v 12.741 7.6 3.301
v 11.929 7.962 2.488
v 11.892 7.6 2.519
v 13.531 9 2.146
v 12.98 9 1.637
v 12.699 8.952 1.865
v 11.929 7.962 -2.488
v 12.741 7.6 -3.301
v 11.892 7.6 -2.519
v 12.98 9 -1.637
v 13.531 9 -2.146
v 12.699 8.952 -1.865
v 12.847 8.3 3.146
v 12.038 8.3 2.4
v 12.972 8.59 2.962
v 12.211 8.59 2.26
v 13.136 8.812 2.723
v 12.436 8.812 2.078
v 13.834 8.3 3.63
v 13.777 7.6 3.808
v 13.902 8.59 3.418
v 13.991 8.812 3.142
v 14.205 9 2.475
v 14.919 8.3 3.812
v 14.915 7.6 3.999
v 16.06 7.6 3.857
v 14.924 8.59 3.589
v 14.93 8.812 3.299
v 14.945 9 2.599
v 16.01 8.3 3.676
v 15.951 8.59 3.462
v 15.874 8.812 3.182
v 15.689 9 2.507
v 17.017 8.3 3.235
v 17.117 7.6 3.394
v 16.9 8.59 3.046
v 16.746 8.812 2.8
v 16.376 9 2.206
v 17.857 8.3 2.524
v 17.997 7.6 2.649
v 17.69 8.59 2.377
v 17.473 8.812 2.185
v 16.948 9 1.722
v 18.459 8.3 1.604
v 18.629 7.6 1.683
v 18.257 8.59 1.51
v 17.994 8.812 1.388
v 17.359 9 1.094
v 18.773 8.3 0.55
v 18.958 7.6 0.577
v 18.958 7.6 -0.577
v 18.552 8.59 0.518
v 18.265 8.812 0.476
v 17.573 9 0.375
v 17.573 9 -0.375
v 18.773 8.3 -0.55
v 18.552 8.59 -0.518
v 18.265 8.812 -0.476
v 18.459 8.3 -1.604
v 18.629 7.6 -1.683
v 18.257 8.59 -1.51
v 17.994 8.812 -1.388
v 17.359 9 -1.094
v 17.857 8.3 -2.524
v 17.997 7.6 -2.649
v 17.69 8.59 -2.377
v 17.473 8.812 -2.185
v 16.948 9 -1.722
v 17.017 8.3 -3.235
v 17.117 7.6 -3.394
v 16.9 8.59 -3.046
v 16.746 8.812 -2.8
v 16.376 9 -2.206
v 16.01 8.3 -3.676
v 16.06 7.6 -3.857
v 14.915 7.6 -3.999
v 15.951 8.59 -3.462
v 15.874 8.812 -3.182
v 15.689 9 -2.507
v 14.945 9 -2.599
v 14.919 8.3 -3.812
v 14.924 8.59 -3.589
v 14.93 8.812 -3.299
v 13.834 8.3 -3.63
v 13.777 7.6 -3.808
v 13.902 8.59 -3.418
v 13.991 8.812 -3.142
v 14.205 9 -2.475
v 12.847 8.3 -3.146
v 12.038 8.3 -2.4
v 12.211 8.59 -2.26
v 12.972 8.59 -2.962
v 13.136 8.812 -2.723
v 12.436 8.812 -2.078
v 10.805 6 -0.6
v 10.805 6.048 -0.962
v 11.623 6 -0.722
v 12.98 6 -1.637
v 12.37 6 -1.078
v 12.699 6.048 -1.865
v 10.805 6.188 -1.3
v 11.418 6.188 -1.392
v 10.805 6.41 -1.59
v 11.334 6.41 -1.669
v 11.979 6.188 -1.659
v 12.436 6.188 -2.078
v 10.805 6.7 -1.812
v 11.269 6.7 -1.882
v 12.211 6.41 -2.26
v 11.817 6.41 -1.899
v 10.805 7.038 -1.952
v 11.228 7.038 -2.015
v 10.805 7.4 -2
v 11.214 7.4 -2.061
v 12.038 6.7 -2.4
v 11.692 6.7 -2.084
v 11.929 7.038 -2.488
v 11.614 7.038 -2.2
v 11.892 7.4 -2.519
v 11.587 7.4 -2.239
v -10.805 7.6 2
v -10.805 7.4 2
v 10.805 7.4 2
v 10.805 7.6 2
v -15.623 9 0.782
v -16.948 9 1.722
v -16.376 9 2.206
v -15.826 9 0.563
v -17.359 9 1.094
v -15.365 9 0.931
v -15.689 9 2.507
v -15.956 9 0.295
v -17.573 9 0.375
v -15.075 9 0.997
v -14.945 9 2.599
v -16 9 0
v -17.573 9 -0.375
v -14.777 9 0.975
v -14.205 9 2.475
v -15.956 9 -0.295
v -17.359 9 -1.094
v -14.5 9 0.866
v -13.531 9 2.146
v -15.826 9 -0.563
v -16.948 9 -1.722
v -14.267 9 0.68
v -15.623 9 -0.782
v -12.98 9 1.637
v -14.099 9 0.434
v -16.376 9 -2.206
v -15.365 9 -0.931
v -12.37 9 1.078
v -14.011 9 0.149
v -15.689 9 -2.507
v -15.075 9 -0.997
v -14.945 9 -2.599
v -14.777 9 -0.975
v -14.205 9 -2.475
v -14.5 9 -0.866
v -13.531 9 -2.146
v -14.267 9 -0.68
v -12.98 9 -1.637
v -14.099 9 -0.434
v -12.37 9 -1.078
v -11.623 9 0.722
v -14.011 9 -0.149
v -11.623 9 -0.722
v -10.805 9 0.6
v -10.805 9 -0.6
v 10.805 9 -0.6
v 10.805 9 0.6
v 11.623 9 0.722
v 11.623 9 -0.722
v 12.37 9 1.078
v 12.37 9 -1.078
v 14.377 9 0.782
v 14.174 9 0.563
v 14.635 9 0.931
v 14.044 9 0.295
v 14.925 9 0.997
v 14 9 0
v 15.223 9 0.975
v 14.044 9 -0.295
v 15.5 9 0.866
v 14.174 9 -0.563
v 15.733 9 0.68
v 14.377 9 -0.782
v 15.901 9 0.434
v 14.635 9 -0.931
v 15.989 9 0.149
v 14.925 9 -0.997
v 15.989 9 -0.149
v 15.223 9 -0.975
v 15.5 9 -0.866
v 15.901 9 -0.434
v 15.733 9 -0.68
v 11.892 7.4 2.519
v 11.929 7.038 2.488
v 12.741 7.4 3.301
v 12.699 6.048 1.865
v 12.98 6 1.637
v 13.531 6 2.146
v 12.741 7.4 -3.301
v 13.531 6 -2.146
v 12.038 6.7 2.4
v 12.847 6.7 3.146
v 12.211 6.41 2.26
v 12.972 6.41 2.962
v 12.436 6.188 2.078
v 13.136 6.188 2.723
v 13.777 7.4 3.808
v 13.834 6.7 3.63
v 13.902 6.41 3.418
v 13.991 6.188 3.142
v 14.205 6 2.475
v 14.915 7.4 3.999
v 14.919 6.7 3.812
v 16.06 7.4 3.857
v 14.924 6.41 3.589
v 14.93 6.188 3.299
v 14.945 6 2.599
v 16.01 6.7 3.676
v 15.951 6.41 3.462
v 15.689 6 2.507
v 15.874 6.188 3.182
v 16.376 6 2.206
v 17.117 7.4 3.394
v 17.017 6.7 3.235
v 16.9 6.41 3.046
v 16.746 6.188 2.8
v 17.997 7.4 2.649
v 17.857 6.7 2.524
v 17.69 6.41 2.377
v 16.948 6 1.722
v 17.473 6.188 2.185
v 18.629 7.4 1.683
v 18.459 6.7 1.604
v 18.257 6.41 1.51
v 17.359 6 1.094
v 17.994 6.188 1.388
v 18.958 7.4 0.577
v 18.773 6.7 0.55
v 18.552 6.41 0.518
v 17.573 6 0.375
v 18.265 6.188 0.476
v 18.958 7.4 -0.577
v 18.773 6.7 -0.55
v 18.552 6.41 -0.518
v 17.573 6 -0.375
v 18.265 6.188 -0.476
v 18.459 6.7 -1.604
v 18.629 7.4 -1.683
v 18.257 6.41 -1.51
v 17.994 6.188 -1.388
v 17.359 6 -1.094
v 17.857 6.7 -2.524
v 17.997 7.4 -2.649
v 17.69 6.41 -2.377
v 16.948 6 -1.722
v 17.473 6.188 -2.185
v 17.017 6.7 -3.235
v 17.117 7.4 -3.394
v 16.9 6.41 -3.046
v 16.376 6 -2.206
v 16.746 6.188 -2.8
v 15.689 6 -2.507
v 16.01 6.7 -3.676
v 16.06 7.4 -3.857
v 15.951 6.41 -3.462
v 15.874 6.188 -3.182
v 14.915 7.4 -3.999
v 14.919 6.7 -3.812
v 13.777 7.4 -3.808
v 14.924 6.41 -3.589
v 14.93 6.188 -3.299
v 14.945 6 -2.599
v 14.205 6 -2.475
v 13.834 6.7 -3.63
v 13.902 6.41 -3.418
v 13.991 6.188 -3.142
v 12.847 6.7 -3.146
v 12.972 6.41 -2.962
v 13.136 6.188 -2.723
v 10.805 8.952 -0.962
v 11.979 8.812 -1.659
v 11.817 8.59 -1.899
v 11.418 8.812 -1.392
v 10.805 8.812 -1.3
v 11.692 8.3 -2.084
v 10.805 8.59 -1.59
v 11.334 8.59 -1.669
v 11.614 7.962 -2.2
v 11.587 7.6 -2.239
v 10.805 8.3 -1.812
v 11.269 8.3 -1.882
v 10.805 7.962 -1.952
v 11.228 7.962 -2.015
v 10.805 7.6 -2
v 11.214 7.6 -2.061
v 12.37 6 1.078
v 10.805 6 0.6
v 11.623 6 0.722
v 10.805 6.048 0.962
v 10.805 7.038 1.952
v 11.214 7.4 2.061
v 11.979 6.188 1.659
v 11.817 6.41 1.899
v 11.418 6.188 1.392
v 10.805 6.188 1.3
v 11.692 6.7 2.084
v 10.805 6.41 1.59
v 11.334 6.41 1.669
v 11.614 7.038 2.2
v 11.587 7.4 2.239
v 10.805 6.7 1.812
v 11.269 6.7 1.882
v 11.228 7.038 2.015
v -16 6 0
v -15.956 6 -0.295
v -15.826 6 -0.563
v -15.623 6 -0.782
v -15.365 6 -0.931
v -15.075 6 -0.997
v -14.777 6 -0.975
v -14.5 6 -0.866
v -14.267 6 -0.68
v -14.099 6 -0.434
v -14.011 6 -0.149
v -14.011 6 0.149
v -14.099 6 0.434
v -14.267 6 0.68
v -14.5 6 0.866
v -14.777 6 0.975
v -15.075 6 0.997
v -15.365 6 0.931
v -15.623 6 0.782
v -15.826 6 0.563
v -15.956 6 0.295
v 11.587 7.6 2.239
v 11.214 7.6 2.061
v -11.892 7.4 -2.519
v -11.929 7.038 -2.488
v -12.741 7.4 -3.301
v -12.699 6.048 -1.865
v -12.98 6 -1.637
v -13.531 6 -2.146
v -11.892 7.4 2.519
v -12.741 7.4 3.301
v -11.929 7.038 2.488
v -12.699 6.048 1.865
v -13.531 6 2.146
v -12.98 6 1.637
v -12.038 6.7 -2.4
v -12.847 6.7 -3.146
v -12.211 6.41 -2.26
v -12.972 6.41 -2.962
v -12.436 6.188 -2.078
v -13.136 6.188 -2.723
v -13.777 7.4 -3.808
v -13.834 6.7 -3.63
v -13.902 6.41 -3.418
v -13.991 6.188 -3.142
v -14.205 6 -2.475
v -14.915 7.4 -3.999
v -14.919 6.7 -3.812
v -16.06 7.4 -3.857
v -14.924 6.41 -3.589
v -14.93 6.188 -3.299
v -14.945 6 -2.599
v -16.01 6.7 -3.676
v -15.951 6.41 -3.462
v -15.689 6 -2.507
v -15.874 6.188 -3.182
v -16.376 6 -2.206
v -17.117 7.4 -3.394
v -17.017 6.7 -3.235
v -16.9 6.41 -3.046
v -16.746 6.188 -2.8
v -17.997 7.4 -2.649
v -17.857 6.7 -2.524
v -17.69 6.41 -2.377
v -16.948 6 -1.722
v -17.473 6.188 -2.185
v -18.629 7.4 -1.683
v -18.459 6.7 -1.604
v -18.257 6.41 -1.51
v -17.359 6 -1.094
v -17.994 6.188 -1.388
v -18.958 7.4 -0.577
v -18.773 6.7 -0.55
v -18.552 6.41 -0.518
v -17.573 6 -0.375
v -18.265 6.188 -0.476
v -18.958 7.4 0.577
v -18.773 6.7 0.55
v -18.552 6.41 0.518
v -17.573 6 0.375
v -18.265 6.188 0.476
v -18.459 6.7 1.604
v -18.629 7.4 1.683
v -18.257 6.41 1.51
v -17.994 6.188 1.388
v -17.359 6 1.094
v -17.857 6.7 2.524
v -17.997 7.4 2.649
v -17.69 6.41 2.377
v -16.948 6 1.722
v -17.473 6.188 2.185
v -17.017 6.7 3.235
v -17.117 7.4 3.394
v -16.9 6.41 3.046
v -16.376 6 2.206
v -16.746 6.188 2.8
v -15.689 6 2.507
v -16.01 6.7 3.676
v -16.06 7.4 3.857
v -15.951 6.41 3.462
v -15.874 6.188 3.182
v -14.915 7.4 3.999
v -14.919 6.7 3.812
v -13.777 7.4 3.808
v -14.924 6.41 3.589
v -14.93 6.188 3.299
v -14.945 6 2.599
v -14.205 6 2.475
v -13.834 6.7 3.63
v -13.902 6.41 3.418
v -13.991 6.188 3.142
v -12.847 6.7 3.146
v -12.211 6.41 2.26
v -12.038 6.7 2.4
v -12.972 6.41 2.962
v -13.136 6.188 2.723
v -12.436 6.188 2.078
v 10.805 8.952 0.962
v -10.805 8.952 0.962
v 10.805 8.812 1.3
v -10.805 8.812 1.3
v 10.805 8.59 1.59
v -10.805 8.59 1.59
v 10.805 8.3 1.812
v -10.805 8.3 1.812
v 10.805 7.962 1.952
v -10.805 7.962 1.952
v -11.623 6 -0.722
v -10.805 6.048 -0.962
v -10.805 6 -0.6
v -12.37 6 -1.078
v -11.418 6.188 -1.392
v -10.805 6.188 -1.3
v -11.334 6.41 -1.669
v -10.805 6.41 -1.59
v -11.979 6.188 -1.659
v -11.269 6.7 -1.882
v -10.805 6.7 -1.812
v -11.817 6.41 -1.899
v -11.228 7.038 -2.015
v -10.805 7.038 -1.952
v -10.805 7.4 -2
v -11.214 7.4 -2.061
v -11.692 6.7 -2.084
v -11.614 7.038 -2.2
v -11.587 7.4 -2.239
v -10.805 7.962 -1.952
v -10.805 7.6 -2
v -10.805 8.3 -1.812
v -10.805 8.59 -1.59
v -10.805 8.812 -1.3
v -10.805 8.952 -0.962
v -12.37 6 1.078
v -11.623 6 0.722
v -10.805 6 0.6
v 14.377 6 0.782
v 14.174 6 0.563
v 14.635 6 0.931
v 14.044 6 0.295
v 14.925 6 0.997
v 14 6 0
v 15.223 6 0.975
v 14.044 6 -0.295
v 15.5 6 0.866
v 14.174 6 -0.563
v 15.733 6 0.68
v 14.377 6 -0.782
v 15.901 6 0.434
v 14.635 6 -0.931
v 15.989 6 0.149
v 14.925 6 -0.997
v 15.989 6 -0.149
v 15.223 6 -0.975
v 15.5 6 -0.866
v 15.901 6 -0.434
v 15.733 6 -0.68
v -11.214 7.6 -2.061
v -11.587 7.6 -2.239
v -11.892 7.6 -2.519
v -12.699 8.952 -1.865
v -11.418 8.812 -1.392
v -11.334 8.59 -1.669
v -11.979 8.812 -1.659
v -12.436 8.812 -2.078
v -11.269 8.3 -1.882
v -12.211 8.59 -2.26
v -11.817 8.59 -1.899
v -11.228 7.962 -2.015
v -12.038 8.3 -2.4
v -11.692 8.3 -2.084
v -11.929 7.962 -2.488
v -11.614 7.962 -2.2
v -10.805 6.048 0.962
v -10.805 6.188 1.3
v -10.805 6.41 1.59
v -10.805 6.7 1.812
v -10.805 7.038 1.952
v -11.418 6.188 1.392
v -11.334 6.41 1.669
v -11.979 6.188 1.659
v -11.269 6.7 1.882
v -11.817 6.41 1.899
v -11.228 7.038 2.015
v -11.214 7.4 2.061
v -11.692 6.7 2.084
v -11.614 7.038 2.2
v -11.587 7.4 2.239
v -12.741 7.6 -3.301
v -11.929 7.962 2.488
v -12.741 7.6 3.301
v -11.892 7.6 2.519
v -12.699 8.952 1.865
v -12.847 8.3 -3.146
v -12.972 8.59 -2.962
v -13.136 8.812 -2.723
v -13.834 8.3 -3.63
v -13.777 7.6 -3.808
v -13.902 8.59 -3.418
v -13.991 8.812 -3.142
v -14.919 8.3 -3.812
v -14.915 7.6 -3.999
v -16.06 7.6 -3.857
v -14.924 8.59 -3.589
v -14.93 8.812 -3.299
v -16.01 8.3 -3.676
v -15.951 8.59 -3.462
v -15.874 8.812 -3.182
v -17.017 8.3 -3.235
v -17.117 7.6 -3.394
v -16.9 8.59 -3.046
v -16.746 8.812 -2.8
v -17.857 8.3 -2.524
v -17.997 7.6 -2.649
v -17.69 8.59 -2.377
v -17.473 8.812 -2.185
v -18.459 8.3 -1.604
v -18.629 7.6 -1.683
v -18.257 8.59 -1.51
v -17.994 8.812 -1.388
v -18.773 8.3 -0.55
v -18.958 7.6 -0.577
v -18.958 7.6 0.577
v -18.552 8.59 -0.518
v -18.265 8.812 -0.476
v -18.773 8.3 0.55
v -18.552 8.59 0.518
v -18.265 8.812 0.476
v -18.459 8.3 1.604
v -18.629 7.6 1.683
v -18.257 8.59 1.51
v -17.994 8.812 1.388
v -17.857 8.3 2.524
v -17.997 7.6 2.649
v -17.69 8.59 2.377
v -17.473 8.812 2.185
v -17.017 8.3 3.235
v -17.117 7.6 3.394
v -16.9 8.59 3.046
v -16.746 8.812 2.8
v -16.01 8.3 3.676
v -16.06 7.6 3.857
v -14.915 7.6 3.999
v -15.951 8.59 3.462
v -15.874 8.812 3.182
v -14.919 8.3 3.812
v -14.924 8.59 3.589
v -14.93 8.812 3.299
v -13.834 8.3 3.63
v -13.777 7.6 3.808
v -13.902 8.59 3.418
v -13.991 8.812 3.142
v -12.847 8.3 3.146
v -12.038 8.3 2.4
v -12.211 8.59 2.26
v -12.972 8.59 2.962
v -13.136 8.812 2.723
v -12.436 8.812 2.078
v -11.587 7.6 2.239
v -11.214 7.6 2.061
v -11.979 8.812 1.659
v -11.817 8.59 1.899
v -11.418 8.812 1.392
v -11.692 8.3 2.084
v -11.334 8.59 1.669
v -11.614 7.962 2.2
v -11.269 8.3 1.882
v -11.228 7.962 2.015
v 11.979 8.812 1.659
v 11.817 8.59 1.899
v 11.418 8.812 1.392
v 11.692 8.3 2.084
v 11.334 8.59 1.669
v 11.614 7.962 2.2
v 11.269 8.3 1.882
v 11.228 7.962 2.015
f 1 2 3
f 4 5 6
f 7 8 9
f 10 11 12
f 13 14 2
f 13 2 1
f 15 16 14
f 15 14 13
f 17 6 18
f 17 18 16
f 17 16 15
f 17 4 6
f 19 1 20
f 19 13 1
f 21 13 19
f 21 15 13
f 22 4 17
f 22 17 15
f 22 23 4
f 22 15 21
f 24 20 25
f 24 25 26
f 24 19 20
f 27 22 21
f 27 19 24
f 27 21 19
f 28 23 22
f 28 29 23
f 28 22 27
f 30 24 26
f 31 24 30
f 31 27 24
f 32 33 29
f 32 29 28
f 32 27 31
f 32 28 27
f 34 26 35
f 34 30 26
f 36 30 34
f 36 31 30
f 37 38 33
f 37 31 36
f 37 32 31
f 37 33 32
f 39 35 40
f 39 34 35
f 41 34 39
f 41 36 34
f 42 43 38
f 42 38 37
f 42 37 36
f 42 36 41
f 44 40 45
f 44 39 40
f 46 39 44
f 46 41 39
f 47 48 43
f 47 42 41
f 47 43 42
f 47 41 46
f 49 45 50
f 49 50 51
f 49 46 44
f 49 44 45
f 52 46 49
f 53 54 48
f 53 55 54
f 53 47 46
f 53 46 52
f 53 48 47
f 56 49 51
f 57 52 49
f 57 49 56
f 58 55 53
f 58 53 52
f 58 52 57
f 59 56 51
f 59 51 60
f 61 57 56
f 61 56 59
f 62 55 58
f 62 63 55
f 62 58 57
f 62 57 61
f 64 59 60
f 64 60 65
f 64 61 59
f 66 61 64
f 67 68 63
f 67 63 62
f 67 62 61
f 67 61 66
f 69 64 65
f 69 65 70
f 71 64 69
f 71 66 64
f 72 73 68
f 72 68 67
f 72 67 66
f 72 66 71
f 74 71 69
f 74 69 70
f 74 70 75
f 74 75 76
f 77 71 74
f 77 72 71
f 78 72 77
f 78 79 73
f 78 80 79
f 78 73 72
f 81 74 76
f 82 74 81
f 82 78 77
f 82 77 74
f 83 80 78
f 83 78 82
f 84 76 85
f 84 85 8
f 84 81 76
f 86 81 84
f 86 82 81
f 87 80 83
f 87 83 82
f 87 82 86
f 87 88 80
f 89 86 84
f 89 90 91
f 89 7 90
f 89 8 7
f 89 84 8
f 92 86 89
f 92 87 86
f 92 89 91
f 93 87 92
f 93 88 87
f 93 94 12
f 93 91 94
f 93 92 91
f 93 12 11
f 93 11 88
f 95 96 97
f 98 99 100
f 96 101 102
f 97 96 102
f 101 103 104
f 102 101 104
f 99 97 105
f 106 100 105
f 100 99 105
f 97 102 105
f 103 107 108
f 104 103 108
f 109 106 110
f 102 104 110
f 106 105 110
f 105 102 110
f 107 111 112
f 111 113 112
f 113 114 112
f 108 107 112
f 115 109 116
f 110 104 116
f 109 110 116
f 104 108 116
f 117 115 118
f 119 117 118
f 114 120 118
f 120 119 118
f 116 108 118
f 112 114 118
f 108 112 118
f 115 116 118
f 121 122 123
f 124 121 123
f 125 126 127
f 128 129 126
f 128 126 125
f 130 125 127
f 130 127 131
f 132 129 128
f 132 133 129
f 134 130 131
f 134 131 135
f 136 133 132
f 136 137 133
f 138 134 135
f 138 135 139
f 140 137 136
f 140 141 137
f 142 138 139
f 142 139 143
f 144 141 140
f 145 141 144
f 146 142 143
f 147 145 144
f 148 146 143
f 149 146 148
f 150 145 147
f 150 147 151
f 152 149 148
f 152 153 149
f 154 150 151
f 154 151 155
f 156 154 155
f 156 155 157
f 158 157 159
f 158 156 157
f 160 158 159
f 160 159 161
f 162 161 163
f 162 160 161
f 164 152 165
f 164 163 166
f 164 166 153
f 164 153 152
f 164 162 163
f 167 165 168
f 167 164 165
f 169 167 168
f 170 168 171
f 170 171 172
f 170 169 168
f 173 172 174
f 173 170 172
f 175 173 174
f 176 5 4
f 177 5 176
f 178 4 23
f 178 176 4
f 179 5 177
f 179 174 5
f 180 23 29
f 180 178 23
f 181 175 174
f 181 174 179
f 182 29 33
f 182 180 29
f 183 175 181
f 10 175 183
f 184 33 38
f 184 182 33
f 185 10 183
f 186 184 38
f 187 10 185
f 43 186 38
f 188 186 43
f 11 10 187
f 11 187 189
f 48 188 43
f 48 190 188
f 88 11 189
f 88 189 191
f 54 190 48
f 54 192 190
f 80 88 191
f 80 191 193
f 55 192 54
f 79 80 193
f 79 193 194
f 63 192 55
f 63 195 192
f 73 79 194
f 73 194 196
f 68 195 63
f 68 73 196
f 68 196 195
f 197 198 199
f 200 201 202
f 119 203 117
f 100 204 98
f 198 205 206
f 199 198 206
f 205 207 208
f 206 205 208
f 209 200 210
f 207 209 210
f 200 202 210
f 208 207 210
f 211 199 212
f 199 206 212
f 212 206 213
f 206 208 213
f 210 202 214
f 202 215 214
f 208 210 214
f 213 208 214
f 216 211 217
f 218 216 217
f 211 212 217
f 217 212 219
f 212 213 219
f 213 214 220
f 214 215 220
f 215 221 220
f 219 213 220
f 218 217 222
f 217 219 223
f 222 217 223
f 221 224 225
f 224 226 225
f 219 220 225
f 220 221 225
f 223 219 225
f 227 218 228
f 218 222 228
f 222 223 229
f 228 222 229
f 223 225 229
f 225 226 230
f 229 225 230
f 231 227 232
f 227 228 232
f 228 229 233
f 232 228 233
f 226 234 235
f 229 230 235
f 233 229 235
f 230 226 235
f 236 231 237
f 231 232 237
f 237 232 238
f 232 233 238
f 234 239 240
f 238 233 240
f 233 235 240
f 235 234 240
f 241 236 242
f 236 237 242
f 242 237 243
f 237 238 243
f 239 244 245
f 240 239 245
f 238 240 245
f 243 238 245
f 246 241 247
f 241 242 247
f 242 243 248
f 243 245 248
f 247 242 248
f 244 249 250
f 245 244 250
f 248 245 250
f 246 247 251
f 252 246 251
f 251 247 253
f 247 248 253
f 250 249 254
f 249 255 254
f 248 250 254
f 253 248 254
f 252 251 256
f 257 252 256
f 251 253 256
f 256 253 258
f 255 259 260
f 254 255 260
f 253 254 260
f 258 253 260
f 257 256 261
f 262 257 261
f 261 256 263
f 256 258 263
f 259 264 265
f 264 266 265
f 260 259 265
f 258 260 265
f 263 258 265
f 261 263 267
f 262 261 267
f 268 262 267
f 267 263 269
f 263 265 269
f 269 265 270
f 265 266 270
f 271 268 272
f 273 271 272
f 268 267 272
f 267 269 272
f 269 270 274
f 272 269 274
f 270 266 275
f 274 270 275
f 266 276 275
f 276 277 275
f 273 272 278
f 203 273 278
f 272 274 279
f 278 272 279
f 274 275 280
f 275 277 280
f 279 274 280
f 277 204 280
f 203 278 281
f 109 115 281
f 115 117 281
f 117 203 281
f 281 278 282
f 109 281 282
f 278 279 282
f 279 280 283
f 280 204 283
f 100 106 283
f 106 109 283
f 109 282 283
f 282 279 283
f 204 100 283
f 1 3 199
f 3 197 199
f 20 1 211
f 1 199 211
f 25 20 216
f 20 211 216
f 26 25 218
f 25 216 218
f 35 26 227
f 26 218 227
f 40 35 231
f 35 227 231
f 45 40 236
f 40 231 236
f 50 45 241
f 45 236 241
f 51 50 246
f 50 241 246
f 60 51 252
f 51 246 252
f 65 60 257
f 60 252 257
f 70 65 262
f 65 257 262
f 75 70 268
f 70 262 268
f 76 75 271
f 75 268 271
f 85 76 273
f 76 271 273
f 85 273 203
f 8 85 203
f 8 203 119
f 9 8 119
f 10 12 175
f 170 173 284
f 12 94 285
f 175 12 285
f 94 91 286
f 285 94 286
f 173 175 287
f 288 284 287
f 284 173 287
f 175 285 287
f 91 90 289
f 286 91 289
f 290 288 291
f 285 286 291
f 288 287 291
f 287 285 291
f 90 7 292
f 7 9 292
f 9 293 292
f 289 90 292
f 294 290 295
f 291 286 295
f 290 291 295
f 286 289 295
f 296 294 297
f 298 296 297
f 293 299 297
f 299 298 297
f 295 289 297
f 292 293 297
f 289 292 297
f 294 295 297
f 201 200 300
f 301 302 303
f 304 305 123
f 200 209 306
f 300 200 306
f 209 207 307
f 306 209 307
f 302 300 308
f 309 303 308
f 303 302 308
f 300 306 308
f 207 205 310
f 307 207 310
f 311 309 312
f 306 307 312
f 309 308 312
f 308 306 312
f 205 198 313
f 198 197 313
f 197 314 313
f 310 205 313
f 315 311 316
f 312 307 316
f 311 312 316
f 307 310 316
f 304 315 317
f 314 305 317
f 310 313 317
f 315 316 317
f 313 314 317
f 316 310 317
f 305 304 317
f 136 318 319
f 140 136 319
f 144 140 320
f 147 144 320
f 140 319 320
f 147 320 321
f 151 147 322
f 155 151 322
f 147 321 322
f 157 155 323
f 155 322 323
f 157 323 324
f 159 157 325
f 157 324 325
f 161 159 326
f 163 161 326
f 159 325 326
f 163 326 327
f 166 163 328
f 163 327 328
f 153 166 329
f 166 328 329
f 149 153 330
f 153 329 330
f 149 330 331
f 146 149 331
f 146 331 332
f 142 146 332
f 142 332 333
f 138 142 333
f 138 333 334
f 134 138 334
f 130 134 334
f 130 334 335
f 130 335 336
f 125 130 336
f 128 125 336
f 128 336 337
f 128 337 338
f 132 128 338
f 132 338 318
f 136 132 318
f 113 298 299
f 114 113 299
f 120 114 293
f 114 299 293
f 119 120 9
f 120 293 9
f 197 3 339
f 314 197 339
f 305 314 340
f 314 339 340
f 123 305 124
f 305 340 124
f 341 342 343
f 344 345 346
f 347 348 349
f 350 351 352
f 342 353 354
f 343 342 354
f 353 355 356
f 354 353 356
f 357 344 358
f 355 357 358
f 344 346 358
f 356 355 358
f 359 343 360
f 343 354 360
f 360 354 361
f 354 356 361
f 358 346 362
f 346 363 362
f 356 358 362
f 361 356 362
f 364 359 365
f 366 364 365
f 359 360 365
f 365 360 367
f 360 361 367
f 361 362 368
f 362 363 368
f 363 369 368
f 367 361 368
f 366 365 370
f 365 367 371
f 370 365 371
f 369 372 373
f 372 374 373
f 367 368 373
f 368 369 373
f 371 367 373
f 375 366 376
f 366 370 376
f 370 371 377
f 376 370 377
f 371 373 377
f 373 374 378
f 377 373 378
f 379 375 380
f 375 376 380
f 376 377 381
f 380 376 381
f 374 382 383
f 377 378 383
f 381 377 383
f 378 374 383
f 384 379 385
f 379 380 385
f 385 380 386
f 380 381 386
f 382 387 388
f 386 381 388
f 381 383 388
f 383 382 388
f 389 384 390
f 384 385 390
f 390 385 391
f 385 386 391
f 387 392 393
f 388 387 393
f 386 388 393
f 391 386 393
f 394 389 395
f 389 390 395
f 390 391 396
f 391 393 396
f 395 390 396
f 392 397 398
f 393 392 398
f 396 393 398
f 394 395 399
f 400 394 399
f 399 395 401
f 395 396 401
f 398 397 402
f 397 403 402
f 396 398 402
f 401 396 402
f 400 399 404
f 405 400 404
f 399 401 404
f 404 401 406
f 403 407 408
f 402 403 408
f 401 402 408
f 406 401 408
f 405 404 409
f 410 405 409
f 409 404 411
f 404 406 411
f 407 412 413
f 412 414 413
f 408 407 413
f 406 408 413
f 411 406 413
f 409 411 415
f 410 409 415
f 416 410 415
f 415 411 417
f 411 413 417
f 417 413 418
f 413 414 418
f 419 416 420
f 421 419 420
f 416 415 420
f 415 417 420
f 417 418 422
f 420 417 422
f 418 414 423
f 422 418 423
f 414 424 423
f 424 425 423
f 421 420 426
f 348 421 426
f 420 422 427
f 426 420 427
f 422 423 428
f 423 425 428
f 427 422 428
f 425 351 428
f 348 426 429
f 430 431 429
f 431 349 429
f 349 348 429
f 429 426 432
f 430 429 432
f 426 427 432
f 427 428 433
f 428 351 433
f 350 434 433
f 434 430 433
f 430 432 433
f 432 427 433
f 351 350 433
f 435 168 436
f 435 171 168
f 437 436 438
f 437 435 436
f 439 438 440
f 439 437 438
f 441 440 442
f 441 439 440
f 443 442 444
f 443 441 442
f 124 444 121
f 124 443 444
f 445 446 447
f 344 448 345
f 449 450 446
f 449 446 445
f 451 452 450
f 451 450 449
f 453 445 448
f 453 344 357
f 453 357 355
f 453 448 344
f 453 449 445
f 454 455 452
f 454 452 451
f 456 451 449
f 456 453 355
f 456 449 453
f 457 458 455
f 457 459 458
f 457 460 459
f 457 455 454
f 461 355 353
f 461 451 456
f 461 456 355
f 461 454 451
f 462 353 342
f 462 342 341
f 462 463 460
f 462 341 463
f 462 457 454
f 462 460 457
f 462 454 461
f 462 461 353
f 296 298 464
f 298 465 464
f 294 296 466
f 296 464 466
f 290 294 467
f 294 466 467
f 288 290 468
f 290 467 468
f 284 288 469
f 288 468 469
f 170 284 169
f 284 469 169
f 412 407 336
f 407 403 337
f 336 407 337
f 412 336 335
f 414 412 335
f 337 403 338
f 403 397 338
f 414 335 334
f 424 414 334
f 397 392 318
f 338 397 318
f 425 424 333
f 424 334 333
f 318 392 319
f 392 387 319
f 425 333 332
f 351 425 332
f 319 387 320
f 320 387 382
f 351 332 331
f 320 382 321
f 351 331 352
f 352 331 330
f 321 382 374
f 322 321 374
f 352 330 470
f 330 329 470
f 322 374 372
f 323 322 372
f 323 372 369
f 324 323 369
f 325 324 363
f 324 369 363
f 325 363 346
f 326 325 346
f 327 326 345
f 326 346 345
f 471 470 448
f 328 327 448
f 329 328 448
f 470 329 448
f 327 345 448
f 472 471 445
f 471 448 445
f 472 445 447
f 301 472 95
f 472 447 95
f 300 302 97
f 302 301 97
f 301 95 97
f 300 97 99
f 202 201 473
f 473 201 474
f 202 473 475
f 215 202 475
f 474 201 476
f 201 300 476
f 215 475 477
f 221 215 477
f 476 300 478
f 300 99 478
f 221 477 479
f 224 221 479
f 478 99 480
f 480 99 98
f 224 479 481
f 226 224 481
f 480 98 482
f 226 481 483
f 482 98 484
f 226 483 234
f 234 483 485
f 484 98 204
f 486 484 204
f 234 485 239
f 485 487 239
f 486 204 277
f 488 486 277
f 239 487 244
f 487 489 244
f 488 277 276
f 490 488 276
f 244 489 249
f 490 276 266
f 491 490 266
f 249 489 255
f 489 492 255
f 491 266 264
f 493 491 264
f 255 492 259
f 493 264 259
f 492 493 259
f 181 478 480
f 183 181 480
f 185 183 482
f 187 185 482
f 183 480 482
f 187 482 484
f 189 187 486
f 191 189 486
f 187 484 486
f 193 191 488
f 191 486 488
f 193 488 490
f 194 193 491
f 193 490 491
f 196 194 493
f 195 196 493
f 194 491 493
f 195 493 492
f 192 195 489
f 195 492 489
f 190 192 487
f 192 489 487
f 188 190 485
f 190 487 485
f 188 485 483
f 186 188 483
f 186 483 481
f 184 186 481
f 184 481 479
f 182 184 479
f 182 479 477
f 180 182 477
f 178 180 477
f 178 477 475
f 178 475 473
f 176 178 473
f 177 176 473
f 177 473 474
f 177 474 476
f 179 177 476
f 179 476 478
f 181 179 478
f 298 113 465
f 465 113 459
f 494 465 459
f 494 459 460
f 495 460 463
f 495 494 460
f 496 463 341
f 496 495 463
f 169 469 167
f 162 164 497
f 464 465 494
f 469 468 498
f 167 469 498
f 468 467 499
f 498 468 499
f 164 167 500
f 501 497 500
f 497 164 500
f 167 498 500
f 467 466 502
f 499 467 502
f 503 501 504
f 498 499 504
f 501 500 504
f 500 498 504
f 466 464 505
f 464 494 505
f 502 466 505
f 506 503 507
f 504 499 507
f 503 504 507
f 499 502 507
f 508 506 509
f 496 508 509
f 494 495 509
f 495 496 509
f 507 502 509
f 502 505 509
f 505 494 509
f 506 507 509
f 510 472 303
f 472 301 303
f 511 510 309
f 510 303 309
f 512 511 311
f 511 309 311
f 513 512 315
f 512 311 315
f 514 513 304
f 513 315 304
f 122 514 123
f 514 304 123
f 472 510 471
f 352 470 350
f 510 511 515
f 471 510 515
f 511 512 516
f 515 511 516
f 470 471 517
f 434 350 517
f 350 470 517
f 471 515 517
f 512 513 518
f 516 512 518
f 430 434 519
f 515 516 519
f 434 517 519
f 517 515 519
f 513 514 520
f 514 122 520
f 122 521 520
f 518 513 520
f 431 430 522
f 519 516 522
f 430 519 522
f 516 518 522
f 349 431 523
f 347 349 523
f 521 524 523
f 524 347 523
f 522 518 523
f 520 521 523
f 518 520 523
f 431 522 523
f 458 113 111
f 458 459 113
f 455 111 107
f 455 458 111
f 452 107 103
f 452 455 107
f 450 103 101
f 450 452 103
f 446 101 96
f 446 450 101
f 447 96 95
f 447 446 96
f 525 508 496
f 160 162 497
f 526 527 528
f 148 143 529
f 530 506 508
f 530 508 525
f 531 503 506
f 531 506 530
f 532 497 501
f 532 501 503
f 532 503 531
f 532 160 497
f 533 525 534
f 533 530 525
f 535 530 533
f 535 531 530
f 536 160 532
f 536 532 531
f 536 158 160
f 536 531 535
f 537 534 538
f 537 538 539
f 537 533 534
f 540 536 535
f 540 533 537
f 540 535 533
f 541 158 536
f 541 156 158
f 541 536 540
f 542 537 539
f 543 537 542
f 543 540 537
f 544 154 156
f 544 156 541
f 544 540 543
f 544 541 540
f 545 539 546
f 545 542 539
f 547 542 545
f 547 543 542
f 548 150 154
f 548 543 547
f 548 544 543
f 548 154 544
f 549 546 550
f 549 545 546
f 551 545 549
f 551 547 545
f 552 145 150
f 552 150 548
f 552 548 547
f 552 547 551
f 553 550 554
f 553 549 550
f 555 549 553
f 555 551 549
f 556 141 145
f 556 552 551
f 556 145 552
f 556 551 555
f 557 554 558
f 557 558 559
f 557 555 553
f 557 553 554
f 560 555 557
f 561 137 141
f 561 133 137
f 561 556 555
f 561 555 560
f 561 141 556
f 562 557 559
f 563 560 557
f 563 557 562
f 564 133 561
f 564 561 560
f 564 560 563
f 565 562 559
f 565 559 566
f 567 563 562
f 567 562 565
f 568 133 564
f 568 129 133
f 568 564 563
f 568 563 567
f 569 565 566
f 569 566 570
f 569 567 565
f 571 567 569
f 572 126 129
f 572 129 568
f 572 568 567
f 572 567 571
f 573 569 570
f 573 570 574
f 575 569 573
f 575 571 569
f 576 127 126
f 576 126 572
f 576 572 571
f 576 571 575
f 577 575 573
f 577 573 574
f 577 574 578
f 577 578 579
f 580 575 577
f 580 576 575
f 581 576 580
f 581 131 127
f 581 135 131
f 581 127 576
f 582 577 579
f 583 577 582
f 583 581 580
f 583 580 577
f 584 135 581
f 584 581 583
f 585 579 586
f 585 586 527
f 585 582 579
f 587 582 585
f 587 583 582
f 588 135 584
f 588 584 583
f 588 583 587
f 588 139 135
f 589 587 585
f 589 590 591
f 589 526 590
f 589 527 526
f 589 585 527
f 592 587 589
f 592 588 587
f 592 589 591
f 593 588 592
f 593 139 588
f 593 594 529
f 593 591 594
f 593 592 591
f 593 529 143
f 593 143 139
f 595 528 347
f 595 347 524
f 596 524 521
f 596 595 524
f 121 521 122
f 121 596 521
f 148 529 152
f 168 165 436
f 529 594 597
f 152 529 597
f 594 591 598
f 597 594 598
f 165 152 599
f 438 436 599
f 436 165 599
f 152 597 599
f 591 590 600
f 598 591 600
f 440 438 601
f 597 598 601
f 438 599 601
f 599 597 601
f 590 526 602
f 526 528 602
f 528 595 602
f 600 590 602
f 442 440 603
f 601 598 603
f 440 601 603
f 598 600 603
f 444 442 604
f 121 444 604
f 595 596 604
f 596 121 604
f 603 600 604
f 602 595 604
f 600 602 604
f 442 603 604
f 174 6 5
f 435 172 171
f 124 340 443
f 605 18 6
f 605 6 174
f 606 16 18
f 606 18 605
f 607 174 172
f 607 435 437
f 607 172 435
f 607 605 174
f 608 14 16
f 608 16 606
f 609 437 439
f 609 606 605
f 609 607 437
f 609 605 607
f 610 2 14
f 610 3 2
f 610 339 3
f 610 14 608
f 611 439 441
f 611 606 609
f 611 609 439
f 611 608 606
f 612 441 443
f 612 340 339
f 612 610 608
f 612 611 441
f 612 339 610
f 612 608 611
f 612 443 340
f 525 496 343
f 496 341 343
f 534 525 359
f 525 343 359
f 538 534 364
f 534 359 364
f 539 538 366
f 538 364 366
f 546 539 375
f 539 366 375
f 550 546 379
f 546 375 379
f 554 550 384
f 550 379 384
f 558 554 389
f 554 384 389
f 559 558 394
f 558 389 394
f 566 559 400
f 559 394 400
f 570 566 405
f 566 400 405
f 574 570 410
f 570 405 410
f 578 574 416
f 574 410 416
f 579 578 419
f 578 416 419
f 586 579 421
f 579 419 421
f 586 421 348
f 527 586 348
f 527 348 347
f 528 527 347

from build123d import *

# Parameters (mm, degrees)
BOSS_EXTRUDE1_DEPTH   = 15
F_1_0MM_DOWEL_HOLE1_D = 10
FILLET1_R             = 7
ESCALA1_SCALE         = 0.2


with BuildPart() as part:
    # Sketch1 → Boss-Extrude1 (new body)
    with BuildSketch(Plane(origin=(0, 0, 0), x_dir=(1, 0, 0), z_dir=(0, 1, 0))):
        with BuildLine():
            Line((57.679491924, 10), (-57.679491924, 10))
            ThreePointArc((-57.679491924, 10), (-95, 0), (-57.679491924, -10))
            Line((-57.679491924, -10), (57.679491924, -10))
            ThreePointArc((57.679491924, -10), (95, 0), (57.679491924, 10))
        make_face()
    extrude(amount=BOSS_EXTRUDE1_DEPTH)

    # Ø1.0mm Dowel Hole1 (through all)
    with Locations(Plane(origin=(0, 15, 0), x_dir=(1, 0, 0), z_dir=(0, 1, 0))):
        with Locations((-75, 0), (75, 0)):
            Hole(F_1_0MM_DOWEL_HOLE1_D / 2)

    # Fillet1
    fillet1_edges = [part.edges().sort_by_distance(p)[0] for p in [
        (95, 15, 0),
        (0, 15, -10),
        (-95, 15, 0),
        (0, 0, -10),
        (95, 0, 0),
        (0, 0, 10),
        (-95, 0, 0),
        (0, 15, 10),
        (-57.679491924, 7.5, -10),
        (57.679491924, 7.5, -10),
        (57.679491924, 7.5, 10),
        (-57.679491924, 7.5, 10),
    ]]
    fillet(fillet1_edges, radius=FILLET1_R)


with BuildPart() as part_1:
    # Escala1: scaled about (0, 7.5, 0)
    add(part.part.scale(ESCALA1_SCALE).moved(Location((0, 6, 0))))


solid = part_1.part
